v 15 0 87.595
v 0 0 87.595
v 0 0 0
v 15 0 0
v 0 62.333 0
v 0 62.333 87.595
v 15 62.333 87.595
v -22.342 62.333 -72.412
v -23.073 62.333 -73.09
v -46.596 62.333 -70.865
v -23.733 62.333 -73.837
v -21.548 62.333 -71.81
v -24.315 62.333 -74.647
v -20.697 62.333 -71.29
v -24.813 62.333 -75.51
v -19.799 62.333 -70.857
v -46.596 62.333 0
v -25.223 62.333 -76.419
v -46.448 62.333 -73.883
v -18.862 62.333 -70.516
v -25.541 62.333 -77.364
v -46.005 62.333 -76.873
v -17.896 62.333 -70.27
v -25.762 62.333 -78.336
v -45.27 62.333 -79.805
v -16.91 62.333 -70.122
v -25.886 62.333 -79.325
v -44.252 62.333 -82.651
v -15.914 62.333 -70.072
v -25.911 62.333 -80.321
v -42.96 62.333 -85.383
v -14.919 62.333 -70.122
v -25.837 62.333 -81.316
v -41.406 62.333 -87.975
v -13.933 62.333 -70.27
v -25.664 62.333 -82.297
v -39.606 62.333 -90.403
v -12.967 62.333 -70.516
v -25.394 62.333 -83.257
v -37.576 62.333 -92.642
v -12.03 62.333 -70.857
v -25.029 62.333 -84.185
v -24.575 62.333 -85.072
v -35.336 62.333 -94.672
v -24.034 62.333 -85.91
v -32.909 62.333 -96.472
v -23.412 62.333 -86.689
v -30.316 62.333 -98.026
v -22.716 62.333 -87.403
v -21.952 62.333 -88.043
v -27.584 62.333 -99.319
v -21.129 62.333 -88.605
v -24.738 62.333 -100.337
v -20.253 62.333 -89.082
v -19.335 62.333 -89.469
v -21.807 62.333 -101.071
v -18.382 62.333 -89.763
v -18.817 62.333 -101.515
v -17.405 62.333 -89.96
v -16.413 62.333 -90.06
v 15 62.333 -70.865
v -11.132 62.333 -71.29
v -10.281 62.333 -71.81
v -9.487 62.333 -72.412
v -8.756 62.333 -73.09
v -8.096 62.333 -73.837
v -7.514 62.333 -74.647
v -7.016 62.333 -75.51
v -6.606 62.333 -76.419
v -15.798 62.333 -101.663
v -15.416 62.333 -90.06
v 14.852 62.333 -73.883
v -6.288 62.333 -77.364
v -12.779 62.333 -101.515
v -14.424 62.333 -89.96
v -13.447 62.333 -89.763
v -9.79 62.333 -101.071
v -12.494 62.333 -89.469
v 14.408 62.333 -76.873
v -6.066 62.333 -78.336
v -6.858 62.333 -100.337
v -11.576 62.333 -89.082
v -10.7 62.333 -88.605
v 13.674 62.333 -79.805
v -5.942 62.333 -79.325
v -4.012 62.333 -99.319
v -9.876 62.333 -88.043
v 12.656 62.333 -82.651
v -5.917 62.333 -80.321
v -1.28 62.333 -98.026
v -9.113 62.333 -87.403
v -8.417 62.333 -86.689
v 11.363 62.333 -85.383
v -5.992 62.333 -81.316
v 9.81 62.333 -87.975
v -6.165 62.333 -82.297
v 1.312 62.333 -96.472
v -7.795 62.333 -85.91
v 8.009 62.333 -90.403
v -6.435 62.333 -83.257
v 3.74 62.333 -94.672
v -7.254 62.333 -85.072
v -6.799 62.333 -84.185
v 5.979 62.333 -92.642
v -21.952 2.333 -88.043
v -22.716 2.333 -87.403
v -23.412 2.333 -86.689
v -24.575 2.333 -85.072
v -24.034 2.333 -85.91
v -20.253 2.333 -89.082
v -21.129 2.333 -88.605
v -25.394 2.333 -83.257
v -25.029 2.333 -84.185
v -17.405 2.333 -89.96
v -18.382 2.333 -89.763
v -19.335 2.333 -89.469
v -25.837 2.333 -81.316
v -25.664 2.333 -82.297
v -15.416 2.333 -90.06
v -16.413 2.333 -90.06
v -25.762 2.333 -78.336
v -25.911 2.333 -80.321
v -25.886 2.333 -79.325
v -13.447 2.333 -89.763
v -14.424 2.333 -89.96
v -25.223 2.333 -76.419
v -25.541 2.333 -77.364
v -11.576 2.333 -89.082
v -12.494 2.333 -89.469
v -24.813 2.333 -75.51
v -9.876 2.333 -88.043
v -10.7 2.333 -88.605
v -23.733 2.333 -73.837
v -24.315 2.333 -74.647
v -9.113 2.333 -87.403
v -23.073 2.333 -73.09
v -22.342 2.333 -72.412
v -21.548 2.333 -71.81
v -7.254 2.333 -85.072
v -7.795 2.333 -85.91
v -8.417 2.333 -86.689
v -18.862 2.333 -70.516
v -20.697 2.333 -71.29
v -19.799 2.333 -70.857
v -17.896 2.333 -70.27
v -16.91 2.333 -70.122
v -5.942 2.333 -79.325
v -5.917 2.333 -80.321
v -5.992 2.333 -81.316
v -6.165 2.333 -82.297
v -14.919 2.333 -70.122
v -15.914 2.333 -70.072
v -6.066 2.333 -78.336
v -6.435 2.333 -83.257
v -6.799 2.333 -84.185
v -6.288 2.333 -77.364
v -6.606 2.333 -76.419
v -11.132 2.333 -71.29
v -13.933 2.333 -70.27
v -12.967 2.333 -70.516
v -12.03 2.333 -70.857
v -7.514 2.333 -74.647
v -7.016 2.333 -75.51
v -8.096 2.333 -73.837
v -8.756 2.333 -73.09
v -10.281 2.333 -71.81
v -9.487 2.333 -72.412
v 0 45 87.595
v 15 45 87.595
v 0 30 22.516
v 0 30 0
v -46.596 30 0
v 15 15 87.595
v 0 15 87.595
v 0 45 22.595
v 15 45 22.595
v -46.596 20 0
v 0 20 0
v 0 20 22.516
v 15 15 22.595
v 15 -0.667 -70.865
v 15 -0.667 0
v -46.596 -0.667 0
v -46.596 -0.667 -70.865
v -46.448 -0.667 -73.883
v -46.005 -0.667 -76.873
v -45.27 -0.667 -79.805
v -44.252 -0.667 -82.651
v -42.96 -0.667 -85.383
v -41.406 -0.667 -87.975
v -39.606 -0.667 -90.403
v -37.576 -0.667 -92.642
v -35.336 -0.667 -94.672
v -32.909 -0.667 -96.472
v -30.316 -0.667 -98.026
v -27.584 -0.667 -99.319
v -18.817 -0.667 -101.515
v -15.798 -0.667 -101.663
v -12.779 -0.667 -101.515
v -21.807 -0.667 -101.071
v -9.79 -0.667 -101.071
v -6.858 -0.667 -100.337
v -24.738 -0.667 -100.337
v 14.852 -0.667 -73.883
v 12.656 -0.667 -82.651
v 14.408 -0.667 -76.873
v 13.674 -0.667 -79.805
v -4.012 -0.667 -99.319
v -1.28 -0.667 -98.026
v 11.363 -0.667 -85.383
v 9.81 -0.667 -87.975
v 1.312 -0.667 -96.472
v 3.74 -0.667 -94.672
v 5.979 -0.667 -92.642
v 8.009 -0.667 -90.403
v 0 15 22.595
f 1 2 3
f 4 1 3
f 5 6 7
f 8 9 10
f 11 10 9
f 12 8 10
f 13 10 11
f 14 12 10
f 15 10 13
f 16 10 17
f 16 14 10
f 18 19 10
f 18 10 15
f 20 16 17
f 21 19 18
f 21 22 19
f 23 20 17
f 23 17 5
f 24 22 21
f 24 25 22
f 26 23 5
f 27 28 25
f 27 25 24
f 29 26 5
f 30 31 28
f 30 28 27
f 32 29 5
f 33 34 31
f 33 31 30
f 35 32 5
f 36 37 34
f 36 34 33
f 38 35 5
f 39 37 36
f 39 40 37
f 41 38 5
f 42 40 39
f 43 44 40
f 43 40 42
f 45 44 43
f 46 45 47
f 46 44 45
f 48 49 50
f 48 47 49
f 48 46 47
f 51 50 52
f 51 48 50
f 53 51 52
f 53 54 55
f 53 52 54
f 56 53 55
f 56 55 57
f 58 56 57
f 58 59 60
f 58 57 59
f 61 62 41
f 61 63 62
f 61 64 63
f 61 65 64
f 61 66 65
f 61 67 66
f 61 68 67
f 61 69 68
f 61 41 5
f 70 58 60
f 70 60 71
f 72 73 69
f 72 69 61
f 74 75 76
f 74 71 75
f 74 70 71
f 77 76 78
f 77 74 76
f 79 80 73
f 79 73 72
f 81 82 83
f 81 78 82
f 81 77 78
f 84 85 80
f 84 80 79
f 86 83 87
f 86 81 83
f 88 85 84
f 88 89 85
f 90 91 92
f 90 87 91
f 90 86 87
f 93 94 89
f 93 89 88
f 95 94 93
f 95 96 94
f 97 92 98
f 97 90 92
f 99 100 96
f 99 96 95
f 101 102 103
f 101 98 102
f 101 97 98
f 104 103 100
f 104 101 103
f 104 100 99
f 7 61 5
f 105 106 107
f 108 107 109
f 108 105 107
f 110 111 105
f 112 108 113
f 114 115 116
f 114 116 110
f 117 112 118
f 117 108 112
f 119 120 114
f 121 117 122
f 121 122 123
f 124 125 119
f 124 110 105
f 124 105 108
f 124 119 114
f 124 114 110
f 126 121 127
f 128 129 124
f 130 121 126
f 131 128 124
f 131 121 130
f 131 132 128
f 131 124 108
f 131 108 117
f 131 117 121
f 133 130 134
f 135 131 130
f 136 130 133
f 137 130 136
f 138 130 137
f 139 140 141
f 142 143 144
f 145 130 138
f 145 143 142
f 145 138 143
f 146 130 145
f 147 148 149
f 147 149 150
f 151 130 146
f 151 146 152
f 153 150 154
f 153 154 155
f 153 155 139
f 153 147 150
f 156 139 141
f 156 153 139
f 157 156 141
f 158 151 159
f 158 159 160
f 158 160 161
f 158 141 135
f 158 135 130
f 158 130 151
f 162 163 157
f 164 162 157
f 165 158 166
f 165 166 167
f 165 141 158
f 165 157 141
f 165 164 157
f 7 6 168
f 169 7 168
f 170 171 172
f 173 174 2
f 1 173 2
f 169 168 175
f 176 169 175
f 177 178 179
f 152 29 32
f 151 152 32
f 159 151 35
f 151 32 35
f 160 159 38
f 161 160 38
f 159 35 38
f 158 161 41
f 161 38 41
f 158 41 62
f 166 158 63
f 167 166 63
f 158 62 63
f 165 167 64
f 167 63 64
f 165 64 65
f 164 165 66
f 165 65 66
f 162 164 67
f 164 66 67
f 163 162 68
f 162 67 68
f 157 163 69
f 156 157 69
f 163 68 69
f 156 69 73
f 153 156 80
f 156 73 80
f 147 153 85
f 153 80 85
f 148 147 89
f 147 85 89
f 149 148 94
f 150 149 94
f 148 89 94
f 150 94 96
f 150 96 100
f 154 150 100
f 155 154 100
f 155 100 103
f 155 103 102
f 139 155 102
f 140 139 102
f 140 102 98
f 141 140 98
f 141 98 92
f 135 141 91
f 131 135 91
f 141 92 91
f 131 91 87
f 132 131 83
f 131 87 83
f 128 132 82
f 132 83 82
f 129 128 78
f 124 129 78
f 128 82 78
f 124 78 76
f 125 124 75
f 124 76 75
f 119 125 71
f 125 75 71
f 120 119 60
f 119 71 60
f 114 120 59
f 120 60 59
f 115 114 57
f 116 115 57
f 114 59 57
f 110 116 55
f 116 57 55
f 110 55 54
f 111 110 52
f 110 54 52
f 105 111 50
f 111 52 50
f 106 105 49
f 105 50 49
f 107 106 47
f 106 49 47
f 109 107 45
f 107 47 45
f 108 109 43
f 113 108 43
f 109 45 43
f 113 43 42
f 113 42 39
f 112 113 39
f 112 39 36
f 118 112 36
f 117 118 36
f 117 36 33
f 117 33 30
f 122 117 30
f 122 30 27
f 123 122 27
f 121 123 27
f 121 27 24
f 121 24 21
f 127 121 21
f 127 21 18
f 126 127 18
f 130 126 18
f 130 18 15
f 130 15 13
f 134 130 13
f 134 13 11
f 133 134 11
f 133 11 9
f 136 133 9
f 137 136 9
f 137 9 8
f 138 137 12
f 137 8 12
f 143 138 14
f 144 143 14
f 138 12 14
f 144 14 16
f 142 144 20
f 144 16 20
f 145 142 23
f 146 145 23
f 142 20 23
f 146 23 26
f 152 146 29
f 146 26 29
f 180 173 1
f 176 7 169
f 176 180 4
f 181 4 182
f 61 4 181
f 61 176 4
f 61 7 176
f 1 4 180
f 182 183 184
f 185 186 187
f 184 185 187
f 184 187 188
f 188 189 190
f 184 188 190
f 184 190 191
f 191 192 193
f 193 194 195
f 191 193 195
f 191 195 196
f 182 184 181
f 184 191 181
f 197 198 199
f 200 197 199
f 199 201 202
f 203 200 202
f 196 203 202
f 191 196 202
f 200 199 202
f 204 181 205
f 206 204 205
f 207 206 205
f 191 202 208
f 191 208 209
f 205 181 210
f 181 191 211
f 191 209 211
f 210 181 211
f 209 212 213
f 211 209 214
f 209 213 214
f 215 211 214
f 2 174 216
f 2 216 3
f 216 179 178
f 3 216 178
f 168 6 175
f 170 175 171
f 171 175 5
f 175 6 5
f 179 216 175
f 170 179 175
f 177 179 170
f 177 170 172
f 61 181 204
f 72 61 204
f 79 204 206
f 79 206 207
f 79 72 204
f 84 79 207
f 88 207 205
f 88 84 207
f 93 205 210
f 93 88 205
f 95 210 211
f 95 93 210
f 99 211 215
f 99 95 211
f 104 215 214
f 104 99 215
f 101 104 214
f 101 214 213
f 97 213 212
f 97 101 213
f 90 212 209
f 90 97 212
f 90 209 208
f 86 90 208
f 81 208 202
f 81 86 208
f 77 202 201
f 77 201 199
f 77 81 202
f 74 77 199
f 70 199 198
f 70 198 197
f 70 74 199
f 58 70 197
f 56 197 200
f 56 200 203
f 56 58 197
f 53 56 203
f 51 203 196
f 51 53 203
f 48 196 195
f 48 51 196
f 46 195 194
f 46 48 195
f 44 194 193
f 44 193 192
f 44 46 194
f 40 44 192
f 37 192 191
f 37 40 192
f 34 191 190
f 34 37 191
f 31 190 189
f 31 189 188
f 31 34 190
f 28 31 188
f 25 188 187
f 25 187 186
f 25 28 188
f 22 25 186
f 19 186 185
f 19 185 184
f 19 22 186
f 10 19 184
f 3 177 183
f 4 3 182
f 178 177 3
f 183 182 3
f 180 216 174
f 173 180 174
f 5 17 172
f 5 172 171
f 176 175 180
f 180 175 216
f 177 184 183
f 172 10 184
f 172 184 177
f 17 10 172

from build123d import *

# Parameters (mm, degrees)
BOSS_EXTRUDE3_DEPTH = 15
BOSS_EXTRUDE6_DEPTH = 63
SKETCH8_R           = 10
CUT_EXTRUDE1_DEPTH  = 60
BOSS_EXTRUDE8_DEPTH = 10


with BuildPart() as part:
    # Sketch4 → Boss-Extrude3 (new body)
    with BuildSketch(Plane(origin=(0, 0, 0), x_dir=(0, 0, -1), z_dir=(1, 0, 0))):
        Polygon((0, 0), (0, 62.333333333), (-87.595238095, 62.333333333), (-87.595238095, 45), (-22.595238095, 45), (-22.595238095, 15), (-87.595238095, 15), (-87.595238095, 0), align=None)
    extrude(amount=BOSS_EXTRUDE3_DEPTH)

    # Sketch7 → Boss-Extrude6 (add)
    with BuildSketch(Plane(origin=(0, 62.333333333, 0), x_dir=(1, 0, 0), z_dir=(0, 1, 0))):
        with BuildLine():
            Line((15, 0), (15, 70.864702181))
            ThreePointArc((15, 70.864702181), (-15.798204654, 101.662906835), (-46.596409308, 70.864702181))
            Line((-46.596409308, 70.864702181), (-46.596409308, 0))
            Line((-46.596409308, 0), (0, 0))
            Line((0, 0), (15, 0))
        make_face()
    extrude(amount=-BOSS_EXTRUDE6_DEPTH)

    # Sketch8 → Cut-Extrude1 (cut)
    with BuildSketch(Plane(origin=(0, 62.333333333, 0), x_dir=(1, 0, 0), z_dir=(0, 1, 0))):
        with Locations(Location((-15.914385608, 80.072094145, 0), (0, 0, 270))):
            Circle(SKETCH8_R)
    extrude(amount=-CUT_EXTRUDE1_DEPTH, mode=Mode.SUBTRACT)

    # Sketch12 → Boss-Extrude8 (add)
    with BuildSketch(Plane(origin=(0, 20, 0), x_dir=(1, 0, 0), z_dir=(0, 1, 0))):
        Polygon((-46.596409308, 0), (0, 0), (0, -22.515812616), align=None)
    extrude(amount=BOSS_EXTRUDE8_DEPTH)


solid = part.part
